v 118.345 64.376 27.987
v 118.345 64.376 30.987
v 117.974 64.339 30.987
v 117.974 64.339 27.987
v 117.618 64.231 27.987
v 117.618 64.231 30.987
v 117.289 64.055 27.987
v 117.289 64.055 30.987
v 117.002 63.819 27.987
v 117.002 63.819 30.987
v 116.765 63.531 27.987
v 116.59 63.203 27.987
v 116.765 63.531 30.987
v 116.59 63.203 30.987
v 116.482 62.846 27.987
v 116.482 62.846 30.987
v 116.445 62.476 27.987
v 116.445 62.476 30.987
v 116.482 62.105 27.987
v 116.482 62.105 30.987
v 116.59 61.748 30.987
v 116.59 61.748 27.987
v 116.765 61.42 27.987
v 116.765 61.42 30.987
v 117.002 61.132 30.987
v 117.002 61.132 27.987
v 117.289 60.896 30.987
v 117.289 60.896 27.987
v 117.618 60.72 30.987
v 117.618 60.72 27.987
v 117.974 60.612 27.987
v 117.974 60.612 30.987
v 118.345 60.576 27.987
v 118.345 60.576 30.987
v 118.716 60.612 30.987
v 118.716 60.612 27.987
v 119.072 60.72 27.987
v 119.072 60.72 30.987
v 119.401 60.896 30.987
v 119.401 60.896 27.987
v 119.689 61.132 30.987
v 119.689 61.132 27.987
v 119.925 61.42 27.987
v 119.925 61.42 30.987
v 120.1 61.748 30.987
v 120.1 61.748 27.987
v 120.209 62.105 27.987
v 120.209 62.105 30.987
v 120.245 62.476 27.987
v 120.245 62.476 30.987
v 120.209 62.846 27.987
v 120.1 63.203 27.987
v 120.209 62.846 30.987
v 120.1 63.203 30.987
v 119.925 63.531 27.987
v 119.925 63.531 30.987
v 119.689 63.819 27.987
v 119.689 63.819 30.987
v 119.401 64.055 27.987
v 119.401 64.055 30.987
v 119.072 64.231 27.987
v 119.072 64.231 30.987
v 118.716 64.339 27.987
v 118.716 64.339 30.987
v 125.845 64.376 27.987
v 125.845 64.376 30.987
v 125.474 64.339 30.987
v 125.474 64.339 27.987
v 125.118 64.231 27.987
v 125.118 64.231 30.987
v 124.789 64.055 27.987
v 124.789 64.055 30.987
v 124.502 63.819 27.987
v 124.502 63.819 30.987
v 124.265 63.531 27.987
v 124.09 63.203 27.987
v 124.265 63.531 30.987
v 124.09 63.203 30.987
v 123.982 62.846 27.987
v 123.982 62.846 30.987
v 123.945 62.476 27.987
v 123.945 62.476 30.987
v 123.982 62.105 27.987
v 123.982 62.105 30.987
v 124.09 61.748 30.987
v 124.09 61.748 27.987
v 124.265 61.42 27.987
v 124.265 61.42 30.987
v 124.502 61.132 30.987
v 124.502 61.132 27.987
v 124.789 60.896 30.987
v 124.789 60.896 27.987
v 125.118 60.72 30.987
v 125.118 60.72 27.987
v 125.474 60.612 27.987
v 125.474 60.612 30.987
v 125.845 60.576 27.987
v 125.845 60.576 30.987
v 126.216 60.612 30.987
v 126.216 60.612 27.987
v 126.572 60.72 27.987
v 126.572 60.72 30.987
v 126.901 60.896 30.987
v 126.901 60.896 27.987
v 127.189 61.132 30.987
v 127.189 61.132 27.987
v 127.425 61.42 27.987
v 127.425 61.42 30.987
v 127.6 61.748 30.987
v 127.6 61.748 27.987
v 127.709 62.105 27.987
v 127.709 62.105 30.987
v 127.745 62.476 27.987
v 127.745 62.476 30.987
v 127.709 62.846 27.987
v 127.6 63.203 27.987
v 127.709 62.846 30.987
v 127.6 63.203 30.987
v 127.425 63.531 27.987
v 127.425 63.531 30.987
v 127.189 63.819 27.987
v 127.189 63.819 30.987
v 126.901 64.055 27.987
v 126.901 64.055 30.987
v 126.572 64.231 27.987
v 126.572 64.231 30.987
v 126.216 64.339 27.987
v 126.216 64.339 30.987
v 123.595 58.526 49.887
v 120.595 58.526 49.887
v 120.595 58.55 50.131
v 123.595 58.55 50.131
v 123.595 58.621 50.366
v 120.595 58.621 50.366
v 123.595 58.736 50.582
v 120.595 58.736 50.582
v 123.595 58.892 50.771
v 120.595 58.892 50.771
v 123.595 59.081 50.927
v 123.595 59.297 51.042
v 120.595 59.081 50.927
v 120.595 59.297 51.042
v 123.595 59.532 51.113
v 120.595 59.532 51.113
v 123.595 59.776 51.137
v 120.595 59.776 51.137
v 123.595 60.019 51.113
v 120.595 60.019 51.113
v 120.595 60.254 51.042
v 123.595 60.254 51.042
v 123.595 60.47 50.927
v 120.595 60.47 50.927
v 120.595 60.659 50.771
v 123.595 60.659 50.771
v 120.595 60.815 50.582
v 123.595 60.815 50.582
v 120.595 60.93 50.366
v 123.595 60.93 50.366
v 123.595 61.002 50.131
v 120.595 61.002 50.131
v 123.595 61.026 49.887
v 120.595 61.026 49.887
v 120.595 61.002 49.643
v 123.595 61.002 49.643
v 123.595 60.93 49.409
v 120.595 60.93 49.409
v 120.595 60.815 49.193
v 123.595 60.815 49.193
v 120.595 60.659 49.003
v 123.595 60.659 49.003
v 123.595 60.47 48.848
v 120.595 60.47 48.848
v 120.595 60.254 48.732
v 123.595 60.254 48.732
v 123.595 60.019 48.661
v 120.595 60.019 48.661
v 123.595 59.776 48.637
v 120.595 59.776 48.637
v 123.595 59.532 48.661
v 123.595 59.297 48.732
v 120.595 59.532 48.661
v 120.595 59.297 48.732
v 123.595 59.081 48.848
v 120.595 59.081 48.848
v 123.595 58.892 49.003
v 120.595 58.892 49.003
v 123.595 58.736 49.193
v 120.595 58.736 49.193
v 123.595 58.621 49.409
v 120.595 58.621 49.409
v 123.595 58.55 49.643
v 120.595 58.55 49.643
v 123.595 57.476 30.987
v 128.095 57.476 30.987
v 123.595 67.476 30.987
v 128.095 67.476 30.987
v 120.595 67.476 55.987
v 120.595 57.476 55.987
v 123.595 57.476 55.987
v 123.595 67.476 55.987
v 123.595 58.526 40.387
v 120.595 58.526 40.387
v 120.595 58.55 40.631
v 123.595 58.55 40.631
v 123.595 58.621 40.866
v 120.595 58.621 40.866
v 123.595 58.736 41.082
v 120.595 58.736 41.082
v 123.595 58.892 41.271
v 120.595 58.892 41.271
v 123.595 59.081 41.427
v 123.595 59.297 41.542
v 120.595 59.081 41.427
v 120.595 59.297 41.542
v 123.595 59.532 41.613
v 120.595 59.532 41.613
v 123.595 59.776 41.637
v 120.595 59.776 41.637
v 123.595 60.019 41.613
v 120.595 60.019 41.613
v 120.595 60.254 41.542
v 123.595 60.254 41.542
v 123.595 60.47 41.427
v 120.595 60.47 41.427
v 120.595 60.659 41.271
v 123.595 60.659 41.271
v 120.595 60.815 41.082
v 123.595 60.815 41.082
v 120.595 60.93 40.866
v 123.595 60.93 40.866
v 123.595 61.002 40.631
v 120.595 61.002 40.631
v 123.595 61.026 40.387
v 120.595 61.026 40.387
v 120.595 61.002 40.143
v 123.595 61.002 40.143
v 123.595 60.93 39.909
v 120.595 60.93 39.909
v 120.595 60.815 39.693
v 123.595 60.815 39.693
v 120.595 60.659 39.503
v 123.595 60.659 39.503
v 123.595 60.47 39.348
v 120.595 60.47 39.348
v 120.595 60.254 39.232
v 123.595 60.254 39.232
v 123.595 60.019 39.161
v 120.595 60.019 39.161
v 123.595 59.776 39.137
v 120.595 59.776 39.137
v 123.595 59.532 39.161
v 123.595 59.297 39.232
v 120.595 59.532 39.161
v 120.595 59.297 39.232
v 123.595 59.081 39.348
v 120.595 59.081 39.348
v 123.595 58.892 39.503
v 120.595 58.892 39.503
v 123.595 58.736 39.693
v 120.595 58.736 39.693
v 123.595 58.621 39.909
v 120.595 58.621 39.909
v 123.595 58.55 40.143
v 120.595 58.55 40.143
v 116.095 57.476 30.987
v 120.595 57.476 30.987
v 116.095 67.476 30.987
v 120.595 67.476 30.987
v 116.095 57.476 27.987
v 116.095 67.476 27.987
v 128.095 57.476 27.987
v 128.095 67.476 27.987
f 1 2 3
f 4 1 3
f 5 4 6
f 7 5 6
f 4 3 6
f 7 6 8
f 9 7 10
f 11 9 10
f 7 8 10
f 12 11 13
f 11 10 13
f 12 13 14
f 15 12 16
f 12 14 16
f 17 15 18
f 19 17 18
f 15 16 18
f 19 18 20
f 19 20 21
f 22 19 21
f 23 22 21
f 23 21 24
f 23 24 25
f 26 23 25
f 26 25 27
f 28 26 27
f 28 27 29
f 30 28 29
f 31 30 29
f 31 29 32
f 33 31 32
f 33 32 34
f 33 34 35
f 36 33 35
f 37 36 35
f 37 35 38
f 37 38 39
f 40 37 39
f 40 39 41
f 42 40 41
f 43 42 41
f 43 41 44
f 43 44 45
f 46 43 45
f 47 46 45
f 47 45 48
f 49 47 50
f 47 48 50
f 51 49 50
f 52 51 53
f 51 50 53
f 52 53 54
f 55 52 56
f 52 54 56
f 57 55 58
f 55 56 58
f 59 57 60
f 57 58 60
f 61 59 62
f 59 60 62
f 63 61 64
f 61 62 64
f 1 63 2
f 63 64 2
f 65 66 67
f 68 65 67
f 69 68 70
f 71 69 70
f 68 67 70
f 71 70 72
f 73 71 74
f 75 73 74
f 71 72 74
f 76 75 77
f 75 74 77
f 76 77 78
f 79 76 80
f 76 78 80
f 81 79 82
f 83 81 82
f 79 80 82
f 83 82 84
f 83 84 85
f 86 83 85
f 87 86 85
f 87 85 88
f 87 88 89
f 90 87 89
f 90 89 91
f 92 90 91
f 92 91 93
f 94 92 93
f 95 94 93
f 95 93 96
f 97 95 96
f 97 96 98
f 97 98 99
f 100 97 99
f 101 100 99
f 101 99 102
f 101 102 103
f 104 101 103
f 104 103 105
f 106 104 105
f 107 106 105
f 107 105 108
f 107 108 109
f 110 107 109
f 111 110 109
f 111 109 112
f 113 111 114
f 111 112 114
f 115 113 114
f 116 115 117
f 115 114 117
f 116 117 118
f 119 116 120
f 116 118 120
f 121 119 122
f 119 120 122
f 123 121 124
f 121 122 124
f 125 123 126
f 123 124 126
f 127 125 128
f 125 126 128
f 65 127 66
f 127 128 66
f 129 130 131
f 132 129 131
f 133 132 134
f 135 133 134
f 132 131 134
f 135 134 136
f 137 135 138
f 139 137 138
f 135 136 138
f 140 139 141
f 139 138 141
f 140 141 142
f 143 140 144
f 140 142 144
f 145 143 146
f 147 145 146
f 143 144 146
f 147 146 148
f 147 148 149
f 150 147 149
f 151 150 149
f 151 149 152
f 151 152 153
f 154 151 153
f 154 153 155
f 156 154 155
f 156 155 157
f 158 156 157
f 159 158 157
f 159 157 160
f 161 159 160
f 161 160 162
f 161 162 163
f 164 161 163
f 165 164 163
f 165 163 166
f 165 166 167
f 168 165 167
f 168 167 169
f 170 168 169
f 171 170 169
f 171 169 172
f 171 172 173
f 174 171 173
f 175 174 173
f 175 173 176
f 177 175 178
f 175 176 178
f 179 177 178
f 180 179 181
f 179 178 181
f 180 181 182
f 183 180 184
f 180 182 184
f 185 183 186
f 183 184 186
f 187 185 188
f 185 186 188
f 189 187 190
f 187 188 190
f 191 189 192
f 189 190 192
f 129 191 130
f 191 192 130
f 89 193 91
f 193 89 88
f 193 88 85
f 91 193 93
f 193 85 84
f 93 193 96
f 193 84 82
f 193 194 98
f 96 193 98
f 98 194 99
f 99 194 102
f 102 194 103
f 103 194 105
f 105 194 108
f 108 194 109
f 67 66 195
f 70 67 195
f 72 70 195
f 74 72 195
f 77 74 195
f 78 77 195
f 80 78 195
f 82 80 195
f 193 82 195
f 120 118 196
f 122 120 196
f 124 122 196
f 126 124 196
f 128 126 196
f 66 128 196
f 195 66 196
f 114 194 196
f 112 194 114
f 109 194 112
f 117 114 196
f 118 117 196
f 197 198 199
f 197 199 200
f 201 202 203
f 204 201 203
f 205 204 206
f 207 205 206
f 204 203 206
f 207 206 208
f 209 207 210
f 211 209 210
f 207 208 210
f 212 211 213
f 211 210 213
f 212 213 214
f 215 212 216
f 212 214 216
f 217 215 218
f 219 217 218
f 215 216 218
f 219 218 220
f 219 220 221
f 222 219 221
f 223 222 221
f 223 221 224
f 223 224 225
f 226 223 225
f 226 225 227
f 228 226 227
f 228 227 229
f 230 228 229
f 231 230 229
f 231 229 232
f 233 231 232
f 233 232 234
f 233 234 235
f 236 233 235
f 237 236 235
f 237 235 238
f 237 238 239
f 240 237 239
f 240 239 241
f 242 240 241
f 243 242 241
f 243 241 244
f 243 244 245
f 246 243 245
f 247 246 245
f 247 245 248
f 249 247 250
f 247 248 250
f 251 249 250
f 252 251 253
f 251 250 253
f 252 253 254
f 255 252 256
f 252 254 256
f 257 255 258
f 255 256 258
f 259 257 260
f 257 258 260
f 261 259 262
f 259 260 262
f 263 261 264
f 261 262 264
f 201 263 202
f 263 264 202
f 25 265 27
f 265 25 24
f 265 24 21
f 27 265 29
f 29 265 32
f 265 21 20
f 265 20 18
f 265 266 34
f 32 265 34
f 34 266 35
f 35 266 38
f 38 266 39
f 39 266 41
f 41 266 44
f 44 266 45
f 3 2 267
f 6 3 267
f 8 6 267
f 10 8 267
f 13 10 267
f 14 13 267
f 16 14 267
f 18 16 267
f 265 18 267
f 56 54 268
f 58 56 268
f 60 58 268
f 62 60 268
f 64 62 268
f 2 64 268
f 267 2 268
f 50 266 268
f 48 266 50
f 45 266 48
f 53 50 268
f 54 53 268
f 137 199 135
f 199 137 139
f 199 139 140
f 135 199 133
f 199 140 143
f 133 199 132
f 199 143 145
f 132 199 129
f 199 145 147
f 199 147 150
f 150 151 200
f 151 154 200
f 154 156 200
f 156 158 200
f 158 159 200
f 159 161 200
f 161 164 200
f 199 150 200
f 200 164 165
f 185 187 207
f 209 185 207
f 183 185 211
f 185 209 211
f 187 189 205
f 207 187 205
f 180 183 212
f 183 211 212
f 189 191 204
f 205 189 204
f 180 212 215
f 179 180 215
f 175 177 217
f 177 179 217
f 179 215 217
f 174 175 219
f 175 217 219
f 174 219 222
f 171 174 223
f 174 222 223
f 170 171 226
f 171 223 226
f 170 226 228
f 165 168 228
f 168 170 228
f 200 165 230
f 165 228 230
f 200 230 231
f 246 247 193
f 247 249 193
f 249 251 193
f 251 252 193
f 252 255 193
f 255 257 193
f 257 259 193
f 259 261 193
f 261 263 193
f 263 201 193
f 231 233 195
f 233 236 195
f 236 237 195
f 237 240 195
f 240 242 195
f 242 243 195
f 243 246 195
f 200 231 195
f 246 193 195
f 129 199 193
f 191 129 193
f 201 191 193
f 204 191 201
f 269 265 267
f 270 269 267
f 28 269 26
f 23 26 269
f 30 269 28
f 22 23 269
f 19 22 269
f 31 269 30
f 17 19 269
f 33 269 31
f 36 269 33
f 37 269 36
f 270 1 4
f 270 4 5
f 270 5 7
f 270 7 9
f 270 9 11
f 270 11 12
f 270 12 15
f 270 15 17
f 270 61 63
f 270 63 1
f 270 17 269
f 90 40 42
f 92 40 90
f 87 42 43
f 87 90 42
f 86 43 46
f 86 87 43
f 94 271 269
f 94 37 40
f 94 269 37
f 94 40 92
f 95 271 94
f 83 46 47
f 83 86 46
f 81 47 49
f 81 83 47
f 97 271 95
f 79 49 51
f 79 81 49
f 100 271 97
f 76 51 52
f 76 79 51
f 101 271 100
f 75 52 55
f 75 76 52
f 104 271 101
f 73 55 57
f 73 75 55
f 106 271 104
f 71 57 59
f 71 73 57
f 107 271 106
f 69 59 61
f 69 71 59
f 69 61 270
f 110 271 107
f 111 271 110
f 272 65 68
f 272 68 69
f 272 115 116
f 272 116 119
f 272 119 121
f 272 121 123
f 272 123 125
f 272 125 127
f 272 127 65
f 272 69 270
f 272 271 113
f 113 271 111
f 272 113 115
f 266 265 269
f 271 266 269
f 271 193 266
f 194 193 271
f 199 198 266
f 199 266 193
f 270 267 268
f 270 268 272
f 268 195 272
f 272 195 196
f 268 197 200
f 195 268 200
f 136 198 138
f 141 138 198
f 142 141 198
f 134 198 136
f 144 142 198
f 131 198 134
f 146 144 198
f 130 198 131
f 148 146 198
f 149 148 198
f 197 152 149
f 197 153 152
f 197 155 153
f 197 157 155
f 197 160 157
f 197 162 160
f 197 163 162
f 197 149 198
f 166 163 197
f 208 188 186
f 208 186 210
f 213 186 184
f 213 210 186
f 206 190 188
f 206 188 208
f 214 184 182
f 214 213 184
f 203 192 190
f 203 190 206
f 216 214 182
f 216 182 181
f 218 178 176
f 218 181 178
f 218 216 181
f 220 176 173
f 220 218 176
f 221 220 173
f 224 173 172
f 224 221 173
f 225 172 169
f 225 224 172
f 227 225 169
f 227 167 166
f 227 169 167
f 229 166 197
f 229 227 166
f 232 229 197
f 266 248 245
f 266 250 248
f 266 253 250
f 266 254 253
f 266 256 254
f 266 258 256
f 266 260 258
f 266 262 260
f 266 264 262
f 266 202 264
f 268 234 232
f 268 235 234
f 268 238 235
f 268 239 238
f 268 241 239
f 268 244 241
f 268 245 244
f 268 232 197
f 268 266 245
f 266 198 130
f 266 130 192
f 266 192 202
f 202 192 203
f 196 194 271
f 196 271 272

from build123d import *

# Parameters (mm, degrees)
SKETCH031_W             = 10
SKETCH031_H             = 3
PAD005_DEPTH            = 25
SKETCH032_R             = 1.25
POCKET025_DEPTH         = 5
BOX002_W                = 10
BOX002_H                = 12
BOX002_DEPTH            = 3
SKETCH033_R             = 1.9
POCKET026_DEPTH         = 3.001
BODY004_ROLL_ANGLE      = -90
BODY004_PLACEMENT_ANGLE = 90


with BuildPart() as part:
    # Sketch031 → Pad005 (new body)
    with BuildSketch(Plane.XZ):
        with Locations((5, 1.5)):
            Rectangle(SKETCH031_W, SKETCH031_H)
    extrude(amount=PAD005_DEPTH)

    # Sketch032 (on Face3 of Pad005) → Pocket025 (cut)
    with BuildSketch(Plane(origin=(0, 0, 3), x_dir=(-1, 0, 0), z_dir=(0, 0, 1))):
        with Locations((-2.3, 18.9)):
            Circle(SKETCH032_R)
        with Locations((-2.3, 9.4)):
            Circle(SKETCH032_R)
    extrude(amount=-POCKET025_DEPTH, mode=Mode.SUBTRACT)

    # Box002 → Box002 (join)
    with BuildSketch(Plane(origin=(0, 0, 7.5), x_dir=(1, 0, 0), z_dir=(0, 1, 0))):
        with Locations((5, 6)):
            Rectangle(BOX002_W, BOX002_H)
    extrude(amount=BOX002_DEPTH)

    # Sketch033 → Pocket026 (cut, through all)
    with BuildSketch(Plane.XZ):
        with Locations((5, -2.25)):
            Circle(SKETCH033_R)
        with Locations((5, 5.25)):
            Circle(SKETCH033_R)
    extrude(amount=-POCKET026_DEPTH, mode=Mode.SUBTRACT)


with BuildPart() as part_1:
    # Body004 roll: moved
    add(part.part.rotate(Axis((0, 0, 0), (1, 0, 0)), BODY004_ROLL_ANGLE))


with BuildPart() as part_2:
    # Body004 placement: moved
    add(part_1.part.moved(Location((123.59503, 57.475552, 30.987237))).rotate(Axis((123.59503, 57.475552, 30.987237), (0, 0, 1)), BODY004_PLACEMENT_ANGLE))


solid = part_2.part
